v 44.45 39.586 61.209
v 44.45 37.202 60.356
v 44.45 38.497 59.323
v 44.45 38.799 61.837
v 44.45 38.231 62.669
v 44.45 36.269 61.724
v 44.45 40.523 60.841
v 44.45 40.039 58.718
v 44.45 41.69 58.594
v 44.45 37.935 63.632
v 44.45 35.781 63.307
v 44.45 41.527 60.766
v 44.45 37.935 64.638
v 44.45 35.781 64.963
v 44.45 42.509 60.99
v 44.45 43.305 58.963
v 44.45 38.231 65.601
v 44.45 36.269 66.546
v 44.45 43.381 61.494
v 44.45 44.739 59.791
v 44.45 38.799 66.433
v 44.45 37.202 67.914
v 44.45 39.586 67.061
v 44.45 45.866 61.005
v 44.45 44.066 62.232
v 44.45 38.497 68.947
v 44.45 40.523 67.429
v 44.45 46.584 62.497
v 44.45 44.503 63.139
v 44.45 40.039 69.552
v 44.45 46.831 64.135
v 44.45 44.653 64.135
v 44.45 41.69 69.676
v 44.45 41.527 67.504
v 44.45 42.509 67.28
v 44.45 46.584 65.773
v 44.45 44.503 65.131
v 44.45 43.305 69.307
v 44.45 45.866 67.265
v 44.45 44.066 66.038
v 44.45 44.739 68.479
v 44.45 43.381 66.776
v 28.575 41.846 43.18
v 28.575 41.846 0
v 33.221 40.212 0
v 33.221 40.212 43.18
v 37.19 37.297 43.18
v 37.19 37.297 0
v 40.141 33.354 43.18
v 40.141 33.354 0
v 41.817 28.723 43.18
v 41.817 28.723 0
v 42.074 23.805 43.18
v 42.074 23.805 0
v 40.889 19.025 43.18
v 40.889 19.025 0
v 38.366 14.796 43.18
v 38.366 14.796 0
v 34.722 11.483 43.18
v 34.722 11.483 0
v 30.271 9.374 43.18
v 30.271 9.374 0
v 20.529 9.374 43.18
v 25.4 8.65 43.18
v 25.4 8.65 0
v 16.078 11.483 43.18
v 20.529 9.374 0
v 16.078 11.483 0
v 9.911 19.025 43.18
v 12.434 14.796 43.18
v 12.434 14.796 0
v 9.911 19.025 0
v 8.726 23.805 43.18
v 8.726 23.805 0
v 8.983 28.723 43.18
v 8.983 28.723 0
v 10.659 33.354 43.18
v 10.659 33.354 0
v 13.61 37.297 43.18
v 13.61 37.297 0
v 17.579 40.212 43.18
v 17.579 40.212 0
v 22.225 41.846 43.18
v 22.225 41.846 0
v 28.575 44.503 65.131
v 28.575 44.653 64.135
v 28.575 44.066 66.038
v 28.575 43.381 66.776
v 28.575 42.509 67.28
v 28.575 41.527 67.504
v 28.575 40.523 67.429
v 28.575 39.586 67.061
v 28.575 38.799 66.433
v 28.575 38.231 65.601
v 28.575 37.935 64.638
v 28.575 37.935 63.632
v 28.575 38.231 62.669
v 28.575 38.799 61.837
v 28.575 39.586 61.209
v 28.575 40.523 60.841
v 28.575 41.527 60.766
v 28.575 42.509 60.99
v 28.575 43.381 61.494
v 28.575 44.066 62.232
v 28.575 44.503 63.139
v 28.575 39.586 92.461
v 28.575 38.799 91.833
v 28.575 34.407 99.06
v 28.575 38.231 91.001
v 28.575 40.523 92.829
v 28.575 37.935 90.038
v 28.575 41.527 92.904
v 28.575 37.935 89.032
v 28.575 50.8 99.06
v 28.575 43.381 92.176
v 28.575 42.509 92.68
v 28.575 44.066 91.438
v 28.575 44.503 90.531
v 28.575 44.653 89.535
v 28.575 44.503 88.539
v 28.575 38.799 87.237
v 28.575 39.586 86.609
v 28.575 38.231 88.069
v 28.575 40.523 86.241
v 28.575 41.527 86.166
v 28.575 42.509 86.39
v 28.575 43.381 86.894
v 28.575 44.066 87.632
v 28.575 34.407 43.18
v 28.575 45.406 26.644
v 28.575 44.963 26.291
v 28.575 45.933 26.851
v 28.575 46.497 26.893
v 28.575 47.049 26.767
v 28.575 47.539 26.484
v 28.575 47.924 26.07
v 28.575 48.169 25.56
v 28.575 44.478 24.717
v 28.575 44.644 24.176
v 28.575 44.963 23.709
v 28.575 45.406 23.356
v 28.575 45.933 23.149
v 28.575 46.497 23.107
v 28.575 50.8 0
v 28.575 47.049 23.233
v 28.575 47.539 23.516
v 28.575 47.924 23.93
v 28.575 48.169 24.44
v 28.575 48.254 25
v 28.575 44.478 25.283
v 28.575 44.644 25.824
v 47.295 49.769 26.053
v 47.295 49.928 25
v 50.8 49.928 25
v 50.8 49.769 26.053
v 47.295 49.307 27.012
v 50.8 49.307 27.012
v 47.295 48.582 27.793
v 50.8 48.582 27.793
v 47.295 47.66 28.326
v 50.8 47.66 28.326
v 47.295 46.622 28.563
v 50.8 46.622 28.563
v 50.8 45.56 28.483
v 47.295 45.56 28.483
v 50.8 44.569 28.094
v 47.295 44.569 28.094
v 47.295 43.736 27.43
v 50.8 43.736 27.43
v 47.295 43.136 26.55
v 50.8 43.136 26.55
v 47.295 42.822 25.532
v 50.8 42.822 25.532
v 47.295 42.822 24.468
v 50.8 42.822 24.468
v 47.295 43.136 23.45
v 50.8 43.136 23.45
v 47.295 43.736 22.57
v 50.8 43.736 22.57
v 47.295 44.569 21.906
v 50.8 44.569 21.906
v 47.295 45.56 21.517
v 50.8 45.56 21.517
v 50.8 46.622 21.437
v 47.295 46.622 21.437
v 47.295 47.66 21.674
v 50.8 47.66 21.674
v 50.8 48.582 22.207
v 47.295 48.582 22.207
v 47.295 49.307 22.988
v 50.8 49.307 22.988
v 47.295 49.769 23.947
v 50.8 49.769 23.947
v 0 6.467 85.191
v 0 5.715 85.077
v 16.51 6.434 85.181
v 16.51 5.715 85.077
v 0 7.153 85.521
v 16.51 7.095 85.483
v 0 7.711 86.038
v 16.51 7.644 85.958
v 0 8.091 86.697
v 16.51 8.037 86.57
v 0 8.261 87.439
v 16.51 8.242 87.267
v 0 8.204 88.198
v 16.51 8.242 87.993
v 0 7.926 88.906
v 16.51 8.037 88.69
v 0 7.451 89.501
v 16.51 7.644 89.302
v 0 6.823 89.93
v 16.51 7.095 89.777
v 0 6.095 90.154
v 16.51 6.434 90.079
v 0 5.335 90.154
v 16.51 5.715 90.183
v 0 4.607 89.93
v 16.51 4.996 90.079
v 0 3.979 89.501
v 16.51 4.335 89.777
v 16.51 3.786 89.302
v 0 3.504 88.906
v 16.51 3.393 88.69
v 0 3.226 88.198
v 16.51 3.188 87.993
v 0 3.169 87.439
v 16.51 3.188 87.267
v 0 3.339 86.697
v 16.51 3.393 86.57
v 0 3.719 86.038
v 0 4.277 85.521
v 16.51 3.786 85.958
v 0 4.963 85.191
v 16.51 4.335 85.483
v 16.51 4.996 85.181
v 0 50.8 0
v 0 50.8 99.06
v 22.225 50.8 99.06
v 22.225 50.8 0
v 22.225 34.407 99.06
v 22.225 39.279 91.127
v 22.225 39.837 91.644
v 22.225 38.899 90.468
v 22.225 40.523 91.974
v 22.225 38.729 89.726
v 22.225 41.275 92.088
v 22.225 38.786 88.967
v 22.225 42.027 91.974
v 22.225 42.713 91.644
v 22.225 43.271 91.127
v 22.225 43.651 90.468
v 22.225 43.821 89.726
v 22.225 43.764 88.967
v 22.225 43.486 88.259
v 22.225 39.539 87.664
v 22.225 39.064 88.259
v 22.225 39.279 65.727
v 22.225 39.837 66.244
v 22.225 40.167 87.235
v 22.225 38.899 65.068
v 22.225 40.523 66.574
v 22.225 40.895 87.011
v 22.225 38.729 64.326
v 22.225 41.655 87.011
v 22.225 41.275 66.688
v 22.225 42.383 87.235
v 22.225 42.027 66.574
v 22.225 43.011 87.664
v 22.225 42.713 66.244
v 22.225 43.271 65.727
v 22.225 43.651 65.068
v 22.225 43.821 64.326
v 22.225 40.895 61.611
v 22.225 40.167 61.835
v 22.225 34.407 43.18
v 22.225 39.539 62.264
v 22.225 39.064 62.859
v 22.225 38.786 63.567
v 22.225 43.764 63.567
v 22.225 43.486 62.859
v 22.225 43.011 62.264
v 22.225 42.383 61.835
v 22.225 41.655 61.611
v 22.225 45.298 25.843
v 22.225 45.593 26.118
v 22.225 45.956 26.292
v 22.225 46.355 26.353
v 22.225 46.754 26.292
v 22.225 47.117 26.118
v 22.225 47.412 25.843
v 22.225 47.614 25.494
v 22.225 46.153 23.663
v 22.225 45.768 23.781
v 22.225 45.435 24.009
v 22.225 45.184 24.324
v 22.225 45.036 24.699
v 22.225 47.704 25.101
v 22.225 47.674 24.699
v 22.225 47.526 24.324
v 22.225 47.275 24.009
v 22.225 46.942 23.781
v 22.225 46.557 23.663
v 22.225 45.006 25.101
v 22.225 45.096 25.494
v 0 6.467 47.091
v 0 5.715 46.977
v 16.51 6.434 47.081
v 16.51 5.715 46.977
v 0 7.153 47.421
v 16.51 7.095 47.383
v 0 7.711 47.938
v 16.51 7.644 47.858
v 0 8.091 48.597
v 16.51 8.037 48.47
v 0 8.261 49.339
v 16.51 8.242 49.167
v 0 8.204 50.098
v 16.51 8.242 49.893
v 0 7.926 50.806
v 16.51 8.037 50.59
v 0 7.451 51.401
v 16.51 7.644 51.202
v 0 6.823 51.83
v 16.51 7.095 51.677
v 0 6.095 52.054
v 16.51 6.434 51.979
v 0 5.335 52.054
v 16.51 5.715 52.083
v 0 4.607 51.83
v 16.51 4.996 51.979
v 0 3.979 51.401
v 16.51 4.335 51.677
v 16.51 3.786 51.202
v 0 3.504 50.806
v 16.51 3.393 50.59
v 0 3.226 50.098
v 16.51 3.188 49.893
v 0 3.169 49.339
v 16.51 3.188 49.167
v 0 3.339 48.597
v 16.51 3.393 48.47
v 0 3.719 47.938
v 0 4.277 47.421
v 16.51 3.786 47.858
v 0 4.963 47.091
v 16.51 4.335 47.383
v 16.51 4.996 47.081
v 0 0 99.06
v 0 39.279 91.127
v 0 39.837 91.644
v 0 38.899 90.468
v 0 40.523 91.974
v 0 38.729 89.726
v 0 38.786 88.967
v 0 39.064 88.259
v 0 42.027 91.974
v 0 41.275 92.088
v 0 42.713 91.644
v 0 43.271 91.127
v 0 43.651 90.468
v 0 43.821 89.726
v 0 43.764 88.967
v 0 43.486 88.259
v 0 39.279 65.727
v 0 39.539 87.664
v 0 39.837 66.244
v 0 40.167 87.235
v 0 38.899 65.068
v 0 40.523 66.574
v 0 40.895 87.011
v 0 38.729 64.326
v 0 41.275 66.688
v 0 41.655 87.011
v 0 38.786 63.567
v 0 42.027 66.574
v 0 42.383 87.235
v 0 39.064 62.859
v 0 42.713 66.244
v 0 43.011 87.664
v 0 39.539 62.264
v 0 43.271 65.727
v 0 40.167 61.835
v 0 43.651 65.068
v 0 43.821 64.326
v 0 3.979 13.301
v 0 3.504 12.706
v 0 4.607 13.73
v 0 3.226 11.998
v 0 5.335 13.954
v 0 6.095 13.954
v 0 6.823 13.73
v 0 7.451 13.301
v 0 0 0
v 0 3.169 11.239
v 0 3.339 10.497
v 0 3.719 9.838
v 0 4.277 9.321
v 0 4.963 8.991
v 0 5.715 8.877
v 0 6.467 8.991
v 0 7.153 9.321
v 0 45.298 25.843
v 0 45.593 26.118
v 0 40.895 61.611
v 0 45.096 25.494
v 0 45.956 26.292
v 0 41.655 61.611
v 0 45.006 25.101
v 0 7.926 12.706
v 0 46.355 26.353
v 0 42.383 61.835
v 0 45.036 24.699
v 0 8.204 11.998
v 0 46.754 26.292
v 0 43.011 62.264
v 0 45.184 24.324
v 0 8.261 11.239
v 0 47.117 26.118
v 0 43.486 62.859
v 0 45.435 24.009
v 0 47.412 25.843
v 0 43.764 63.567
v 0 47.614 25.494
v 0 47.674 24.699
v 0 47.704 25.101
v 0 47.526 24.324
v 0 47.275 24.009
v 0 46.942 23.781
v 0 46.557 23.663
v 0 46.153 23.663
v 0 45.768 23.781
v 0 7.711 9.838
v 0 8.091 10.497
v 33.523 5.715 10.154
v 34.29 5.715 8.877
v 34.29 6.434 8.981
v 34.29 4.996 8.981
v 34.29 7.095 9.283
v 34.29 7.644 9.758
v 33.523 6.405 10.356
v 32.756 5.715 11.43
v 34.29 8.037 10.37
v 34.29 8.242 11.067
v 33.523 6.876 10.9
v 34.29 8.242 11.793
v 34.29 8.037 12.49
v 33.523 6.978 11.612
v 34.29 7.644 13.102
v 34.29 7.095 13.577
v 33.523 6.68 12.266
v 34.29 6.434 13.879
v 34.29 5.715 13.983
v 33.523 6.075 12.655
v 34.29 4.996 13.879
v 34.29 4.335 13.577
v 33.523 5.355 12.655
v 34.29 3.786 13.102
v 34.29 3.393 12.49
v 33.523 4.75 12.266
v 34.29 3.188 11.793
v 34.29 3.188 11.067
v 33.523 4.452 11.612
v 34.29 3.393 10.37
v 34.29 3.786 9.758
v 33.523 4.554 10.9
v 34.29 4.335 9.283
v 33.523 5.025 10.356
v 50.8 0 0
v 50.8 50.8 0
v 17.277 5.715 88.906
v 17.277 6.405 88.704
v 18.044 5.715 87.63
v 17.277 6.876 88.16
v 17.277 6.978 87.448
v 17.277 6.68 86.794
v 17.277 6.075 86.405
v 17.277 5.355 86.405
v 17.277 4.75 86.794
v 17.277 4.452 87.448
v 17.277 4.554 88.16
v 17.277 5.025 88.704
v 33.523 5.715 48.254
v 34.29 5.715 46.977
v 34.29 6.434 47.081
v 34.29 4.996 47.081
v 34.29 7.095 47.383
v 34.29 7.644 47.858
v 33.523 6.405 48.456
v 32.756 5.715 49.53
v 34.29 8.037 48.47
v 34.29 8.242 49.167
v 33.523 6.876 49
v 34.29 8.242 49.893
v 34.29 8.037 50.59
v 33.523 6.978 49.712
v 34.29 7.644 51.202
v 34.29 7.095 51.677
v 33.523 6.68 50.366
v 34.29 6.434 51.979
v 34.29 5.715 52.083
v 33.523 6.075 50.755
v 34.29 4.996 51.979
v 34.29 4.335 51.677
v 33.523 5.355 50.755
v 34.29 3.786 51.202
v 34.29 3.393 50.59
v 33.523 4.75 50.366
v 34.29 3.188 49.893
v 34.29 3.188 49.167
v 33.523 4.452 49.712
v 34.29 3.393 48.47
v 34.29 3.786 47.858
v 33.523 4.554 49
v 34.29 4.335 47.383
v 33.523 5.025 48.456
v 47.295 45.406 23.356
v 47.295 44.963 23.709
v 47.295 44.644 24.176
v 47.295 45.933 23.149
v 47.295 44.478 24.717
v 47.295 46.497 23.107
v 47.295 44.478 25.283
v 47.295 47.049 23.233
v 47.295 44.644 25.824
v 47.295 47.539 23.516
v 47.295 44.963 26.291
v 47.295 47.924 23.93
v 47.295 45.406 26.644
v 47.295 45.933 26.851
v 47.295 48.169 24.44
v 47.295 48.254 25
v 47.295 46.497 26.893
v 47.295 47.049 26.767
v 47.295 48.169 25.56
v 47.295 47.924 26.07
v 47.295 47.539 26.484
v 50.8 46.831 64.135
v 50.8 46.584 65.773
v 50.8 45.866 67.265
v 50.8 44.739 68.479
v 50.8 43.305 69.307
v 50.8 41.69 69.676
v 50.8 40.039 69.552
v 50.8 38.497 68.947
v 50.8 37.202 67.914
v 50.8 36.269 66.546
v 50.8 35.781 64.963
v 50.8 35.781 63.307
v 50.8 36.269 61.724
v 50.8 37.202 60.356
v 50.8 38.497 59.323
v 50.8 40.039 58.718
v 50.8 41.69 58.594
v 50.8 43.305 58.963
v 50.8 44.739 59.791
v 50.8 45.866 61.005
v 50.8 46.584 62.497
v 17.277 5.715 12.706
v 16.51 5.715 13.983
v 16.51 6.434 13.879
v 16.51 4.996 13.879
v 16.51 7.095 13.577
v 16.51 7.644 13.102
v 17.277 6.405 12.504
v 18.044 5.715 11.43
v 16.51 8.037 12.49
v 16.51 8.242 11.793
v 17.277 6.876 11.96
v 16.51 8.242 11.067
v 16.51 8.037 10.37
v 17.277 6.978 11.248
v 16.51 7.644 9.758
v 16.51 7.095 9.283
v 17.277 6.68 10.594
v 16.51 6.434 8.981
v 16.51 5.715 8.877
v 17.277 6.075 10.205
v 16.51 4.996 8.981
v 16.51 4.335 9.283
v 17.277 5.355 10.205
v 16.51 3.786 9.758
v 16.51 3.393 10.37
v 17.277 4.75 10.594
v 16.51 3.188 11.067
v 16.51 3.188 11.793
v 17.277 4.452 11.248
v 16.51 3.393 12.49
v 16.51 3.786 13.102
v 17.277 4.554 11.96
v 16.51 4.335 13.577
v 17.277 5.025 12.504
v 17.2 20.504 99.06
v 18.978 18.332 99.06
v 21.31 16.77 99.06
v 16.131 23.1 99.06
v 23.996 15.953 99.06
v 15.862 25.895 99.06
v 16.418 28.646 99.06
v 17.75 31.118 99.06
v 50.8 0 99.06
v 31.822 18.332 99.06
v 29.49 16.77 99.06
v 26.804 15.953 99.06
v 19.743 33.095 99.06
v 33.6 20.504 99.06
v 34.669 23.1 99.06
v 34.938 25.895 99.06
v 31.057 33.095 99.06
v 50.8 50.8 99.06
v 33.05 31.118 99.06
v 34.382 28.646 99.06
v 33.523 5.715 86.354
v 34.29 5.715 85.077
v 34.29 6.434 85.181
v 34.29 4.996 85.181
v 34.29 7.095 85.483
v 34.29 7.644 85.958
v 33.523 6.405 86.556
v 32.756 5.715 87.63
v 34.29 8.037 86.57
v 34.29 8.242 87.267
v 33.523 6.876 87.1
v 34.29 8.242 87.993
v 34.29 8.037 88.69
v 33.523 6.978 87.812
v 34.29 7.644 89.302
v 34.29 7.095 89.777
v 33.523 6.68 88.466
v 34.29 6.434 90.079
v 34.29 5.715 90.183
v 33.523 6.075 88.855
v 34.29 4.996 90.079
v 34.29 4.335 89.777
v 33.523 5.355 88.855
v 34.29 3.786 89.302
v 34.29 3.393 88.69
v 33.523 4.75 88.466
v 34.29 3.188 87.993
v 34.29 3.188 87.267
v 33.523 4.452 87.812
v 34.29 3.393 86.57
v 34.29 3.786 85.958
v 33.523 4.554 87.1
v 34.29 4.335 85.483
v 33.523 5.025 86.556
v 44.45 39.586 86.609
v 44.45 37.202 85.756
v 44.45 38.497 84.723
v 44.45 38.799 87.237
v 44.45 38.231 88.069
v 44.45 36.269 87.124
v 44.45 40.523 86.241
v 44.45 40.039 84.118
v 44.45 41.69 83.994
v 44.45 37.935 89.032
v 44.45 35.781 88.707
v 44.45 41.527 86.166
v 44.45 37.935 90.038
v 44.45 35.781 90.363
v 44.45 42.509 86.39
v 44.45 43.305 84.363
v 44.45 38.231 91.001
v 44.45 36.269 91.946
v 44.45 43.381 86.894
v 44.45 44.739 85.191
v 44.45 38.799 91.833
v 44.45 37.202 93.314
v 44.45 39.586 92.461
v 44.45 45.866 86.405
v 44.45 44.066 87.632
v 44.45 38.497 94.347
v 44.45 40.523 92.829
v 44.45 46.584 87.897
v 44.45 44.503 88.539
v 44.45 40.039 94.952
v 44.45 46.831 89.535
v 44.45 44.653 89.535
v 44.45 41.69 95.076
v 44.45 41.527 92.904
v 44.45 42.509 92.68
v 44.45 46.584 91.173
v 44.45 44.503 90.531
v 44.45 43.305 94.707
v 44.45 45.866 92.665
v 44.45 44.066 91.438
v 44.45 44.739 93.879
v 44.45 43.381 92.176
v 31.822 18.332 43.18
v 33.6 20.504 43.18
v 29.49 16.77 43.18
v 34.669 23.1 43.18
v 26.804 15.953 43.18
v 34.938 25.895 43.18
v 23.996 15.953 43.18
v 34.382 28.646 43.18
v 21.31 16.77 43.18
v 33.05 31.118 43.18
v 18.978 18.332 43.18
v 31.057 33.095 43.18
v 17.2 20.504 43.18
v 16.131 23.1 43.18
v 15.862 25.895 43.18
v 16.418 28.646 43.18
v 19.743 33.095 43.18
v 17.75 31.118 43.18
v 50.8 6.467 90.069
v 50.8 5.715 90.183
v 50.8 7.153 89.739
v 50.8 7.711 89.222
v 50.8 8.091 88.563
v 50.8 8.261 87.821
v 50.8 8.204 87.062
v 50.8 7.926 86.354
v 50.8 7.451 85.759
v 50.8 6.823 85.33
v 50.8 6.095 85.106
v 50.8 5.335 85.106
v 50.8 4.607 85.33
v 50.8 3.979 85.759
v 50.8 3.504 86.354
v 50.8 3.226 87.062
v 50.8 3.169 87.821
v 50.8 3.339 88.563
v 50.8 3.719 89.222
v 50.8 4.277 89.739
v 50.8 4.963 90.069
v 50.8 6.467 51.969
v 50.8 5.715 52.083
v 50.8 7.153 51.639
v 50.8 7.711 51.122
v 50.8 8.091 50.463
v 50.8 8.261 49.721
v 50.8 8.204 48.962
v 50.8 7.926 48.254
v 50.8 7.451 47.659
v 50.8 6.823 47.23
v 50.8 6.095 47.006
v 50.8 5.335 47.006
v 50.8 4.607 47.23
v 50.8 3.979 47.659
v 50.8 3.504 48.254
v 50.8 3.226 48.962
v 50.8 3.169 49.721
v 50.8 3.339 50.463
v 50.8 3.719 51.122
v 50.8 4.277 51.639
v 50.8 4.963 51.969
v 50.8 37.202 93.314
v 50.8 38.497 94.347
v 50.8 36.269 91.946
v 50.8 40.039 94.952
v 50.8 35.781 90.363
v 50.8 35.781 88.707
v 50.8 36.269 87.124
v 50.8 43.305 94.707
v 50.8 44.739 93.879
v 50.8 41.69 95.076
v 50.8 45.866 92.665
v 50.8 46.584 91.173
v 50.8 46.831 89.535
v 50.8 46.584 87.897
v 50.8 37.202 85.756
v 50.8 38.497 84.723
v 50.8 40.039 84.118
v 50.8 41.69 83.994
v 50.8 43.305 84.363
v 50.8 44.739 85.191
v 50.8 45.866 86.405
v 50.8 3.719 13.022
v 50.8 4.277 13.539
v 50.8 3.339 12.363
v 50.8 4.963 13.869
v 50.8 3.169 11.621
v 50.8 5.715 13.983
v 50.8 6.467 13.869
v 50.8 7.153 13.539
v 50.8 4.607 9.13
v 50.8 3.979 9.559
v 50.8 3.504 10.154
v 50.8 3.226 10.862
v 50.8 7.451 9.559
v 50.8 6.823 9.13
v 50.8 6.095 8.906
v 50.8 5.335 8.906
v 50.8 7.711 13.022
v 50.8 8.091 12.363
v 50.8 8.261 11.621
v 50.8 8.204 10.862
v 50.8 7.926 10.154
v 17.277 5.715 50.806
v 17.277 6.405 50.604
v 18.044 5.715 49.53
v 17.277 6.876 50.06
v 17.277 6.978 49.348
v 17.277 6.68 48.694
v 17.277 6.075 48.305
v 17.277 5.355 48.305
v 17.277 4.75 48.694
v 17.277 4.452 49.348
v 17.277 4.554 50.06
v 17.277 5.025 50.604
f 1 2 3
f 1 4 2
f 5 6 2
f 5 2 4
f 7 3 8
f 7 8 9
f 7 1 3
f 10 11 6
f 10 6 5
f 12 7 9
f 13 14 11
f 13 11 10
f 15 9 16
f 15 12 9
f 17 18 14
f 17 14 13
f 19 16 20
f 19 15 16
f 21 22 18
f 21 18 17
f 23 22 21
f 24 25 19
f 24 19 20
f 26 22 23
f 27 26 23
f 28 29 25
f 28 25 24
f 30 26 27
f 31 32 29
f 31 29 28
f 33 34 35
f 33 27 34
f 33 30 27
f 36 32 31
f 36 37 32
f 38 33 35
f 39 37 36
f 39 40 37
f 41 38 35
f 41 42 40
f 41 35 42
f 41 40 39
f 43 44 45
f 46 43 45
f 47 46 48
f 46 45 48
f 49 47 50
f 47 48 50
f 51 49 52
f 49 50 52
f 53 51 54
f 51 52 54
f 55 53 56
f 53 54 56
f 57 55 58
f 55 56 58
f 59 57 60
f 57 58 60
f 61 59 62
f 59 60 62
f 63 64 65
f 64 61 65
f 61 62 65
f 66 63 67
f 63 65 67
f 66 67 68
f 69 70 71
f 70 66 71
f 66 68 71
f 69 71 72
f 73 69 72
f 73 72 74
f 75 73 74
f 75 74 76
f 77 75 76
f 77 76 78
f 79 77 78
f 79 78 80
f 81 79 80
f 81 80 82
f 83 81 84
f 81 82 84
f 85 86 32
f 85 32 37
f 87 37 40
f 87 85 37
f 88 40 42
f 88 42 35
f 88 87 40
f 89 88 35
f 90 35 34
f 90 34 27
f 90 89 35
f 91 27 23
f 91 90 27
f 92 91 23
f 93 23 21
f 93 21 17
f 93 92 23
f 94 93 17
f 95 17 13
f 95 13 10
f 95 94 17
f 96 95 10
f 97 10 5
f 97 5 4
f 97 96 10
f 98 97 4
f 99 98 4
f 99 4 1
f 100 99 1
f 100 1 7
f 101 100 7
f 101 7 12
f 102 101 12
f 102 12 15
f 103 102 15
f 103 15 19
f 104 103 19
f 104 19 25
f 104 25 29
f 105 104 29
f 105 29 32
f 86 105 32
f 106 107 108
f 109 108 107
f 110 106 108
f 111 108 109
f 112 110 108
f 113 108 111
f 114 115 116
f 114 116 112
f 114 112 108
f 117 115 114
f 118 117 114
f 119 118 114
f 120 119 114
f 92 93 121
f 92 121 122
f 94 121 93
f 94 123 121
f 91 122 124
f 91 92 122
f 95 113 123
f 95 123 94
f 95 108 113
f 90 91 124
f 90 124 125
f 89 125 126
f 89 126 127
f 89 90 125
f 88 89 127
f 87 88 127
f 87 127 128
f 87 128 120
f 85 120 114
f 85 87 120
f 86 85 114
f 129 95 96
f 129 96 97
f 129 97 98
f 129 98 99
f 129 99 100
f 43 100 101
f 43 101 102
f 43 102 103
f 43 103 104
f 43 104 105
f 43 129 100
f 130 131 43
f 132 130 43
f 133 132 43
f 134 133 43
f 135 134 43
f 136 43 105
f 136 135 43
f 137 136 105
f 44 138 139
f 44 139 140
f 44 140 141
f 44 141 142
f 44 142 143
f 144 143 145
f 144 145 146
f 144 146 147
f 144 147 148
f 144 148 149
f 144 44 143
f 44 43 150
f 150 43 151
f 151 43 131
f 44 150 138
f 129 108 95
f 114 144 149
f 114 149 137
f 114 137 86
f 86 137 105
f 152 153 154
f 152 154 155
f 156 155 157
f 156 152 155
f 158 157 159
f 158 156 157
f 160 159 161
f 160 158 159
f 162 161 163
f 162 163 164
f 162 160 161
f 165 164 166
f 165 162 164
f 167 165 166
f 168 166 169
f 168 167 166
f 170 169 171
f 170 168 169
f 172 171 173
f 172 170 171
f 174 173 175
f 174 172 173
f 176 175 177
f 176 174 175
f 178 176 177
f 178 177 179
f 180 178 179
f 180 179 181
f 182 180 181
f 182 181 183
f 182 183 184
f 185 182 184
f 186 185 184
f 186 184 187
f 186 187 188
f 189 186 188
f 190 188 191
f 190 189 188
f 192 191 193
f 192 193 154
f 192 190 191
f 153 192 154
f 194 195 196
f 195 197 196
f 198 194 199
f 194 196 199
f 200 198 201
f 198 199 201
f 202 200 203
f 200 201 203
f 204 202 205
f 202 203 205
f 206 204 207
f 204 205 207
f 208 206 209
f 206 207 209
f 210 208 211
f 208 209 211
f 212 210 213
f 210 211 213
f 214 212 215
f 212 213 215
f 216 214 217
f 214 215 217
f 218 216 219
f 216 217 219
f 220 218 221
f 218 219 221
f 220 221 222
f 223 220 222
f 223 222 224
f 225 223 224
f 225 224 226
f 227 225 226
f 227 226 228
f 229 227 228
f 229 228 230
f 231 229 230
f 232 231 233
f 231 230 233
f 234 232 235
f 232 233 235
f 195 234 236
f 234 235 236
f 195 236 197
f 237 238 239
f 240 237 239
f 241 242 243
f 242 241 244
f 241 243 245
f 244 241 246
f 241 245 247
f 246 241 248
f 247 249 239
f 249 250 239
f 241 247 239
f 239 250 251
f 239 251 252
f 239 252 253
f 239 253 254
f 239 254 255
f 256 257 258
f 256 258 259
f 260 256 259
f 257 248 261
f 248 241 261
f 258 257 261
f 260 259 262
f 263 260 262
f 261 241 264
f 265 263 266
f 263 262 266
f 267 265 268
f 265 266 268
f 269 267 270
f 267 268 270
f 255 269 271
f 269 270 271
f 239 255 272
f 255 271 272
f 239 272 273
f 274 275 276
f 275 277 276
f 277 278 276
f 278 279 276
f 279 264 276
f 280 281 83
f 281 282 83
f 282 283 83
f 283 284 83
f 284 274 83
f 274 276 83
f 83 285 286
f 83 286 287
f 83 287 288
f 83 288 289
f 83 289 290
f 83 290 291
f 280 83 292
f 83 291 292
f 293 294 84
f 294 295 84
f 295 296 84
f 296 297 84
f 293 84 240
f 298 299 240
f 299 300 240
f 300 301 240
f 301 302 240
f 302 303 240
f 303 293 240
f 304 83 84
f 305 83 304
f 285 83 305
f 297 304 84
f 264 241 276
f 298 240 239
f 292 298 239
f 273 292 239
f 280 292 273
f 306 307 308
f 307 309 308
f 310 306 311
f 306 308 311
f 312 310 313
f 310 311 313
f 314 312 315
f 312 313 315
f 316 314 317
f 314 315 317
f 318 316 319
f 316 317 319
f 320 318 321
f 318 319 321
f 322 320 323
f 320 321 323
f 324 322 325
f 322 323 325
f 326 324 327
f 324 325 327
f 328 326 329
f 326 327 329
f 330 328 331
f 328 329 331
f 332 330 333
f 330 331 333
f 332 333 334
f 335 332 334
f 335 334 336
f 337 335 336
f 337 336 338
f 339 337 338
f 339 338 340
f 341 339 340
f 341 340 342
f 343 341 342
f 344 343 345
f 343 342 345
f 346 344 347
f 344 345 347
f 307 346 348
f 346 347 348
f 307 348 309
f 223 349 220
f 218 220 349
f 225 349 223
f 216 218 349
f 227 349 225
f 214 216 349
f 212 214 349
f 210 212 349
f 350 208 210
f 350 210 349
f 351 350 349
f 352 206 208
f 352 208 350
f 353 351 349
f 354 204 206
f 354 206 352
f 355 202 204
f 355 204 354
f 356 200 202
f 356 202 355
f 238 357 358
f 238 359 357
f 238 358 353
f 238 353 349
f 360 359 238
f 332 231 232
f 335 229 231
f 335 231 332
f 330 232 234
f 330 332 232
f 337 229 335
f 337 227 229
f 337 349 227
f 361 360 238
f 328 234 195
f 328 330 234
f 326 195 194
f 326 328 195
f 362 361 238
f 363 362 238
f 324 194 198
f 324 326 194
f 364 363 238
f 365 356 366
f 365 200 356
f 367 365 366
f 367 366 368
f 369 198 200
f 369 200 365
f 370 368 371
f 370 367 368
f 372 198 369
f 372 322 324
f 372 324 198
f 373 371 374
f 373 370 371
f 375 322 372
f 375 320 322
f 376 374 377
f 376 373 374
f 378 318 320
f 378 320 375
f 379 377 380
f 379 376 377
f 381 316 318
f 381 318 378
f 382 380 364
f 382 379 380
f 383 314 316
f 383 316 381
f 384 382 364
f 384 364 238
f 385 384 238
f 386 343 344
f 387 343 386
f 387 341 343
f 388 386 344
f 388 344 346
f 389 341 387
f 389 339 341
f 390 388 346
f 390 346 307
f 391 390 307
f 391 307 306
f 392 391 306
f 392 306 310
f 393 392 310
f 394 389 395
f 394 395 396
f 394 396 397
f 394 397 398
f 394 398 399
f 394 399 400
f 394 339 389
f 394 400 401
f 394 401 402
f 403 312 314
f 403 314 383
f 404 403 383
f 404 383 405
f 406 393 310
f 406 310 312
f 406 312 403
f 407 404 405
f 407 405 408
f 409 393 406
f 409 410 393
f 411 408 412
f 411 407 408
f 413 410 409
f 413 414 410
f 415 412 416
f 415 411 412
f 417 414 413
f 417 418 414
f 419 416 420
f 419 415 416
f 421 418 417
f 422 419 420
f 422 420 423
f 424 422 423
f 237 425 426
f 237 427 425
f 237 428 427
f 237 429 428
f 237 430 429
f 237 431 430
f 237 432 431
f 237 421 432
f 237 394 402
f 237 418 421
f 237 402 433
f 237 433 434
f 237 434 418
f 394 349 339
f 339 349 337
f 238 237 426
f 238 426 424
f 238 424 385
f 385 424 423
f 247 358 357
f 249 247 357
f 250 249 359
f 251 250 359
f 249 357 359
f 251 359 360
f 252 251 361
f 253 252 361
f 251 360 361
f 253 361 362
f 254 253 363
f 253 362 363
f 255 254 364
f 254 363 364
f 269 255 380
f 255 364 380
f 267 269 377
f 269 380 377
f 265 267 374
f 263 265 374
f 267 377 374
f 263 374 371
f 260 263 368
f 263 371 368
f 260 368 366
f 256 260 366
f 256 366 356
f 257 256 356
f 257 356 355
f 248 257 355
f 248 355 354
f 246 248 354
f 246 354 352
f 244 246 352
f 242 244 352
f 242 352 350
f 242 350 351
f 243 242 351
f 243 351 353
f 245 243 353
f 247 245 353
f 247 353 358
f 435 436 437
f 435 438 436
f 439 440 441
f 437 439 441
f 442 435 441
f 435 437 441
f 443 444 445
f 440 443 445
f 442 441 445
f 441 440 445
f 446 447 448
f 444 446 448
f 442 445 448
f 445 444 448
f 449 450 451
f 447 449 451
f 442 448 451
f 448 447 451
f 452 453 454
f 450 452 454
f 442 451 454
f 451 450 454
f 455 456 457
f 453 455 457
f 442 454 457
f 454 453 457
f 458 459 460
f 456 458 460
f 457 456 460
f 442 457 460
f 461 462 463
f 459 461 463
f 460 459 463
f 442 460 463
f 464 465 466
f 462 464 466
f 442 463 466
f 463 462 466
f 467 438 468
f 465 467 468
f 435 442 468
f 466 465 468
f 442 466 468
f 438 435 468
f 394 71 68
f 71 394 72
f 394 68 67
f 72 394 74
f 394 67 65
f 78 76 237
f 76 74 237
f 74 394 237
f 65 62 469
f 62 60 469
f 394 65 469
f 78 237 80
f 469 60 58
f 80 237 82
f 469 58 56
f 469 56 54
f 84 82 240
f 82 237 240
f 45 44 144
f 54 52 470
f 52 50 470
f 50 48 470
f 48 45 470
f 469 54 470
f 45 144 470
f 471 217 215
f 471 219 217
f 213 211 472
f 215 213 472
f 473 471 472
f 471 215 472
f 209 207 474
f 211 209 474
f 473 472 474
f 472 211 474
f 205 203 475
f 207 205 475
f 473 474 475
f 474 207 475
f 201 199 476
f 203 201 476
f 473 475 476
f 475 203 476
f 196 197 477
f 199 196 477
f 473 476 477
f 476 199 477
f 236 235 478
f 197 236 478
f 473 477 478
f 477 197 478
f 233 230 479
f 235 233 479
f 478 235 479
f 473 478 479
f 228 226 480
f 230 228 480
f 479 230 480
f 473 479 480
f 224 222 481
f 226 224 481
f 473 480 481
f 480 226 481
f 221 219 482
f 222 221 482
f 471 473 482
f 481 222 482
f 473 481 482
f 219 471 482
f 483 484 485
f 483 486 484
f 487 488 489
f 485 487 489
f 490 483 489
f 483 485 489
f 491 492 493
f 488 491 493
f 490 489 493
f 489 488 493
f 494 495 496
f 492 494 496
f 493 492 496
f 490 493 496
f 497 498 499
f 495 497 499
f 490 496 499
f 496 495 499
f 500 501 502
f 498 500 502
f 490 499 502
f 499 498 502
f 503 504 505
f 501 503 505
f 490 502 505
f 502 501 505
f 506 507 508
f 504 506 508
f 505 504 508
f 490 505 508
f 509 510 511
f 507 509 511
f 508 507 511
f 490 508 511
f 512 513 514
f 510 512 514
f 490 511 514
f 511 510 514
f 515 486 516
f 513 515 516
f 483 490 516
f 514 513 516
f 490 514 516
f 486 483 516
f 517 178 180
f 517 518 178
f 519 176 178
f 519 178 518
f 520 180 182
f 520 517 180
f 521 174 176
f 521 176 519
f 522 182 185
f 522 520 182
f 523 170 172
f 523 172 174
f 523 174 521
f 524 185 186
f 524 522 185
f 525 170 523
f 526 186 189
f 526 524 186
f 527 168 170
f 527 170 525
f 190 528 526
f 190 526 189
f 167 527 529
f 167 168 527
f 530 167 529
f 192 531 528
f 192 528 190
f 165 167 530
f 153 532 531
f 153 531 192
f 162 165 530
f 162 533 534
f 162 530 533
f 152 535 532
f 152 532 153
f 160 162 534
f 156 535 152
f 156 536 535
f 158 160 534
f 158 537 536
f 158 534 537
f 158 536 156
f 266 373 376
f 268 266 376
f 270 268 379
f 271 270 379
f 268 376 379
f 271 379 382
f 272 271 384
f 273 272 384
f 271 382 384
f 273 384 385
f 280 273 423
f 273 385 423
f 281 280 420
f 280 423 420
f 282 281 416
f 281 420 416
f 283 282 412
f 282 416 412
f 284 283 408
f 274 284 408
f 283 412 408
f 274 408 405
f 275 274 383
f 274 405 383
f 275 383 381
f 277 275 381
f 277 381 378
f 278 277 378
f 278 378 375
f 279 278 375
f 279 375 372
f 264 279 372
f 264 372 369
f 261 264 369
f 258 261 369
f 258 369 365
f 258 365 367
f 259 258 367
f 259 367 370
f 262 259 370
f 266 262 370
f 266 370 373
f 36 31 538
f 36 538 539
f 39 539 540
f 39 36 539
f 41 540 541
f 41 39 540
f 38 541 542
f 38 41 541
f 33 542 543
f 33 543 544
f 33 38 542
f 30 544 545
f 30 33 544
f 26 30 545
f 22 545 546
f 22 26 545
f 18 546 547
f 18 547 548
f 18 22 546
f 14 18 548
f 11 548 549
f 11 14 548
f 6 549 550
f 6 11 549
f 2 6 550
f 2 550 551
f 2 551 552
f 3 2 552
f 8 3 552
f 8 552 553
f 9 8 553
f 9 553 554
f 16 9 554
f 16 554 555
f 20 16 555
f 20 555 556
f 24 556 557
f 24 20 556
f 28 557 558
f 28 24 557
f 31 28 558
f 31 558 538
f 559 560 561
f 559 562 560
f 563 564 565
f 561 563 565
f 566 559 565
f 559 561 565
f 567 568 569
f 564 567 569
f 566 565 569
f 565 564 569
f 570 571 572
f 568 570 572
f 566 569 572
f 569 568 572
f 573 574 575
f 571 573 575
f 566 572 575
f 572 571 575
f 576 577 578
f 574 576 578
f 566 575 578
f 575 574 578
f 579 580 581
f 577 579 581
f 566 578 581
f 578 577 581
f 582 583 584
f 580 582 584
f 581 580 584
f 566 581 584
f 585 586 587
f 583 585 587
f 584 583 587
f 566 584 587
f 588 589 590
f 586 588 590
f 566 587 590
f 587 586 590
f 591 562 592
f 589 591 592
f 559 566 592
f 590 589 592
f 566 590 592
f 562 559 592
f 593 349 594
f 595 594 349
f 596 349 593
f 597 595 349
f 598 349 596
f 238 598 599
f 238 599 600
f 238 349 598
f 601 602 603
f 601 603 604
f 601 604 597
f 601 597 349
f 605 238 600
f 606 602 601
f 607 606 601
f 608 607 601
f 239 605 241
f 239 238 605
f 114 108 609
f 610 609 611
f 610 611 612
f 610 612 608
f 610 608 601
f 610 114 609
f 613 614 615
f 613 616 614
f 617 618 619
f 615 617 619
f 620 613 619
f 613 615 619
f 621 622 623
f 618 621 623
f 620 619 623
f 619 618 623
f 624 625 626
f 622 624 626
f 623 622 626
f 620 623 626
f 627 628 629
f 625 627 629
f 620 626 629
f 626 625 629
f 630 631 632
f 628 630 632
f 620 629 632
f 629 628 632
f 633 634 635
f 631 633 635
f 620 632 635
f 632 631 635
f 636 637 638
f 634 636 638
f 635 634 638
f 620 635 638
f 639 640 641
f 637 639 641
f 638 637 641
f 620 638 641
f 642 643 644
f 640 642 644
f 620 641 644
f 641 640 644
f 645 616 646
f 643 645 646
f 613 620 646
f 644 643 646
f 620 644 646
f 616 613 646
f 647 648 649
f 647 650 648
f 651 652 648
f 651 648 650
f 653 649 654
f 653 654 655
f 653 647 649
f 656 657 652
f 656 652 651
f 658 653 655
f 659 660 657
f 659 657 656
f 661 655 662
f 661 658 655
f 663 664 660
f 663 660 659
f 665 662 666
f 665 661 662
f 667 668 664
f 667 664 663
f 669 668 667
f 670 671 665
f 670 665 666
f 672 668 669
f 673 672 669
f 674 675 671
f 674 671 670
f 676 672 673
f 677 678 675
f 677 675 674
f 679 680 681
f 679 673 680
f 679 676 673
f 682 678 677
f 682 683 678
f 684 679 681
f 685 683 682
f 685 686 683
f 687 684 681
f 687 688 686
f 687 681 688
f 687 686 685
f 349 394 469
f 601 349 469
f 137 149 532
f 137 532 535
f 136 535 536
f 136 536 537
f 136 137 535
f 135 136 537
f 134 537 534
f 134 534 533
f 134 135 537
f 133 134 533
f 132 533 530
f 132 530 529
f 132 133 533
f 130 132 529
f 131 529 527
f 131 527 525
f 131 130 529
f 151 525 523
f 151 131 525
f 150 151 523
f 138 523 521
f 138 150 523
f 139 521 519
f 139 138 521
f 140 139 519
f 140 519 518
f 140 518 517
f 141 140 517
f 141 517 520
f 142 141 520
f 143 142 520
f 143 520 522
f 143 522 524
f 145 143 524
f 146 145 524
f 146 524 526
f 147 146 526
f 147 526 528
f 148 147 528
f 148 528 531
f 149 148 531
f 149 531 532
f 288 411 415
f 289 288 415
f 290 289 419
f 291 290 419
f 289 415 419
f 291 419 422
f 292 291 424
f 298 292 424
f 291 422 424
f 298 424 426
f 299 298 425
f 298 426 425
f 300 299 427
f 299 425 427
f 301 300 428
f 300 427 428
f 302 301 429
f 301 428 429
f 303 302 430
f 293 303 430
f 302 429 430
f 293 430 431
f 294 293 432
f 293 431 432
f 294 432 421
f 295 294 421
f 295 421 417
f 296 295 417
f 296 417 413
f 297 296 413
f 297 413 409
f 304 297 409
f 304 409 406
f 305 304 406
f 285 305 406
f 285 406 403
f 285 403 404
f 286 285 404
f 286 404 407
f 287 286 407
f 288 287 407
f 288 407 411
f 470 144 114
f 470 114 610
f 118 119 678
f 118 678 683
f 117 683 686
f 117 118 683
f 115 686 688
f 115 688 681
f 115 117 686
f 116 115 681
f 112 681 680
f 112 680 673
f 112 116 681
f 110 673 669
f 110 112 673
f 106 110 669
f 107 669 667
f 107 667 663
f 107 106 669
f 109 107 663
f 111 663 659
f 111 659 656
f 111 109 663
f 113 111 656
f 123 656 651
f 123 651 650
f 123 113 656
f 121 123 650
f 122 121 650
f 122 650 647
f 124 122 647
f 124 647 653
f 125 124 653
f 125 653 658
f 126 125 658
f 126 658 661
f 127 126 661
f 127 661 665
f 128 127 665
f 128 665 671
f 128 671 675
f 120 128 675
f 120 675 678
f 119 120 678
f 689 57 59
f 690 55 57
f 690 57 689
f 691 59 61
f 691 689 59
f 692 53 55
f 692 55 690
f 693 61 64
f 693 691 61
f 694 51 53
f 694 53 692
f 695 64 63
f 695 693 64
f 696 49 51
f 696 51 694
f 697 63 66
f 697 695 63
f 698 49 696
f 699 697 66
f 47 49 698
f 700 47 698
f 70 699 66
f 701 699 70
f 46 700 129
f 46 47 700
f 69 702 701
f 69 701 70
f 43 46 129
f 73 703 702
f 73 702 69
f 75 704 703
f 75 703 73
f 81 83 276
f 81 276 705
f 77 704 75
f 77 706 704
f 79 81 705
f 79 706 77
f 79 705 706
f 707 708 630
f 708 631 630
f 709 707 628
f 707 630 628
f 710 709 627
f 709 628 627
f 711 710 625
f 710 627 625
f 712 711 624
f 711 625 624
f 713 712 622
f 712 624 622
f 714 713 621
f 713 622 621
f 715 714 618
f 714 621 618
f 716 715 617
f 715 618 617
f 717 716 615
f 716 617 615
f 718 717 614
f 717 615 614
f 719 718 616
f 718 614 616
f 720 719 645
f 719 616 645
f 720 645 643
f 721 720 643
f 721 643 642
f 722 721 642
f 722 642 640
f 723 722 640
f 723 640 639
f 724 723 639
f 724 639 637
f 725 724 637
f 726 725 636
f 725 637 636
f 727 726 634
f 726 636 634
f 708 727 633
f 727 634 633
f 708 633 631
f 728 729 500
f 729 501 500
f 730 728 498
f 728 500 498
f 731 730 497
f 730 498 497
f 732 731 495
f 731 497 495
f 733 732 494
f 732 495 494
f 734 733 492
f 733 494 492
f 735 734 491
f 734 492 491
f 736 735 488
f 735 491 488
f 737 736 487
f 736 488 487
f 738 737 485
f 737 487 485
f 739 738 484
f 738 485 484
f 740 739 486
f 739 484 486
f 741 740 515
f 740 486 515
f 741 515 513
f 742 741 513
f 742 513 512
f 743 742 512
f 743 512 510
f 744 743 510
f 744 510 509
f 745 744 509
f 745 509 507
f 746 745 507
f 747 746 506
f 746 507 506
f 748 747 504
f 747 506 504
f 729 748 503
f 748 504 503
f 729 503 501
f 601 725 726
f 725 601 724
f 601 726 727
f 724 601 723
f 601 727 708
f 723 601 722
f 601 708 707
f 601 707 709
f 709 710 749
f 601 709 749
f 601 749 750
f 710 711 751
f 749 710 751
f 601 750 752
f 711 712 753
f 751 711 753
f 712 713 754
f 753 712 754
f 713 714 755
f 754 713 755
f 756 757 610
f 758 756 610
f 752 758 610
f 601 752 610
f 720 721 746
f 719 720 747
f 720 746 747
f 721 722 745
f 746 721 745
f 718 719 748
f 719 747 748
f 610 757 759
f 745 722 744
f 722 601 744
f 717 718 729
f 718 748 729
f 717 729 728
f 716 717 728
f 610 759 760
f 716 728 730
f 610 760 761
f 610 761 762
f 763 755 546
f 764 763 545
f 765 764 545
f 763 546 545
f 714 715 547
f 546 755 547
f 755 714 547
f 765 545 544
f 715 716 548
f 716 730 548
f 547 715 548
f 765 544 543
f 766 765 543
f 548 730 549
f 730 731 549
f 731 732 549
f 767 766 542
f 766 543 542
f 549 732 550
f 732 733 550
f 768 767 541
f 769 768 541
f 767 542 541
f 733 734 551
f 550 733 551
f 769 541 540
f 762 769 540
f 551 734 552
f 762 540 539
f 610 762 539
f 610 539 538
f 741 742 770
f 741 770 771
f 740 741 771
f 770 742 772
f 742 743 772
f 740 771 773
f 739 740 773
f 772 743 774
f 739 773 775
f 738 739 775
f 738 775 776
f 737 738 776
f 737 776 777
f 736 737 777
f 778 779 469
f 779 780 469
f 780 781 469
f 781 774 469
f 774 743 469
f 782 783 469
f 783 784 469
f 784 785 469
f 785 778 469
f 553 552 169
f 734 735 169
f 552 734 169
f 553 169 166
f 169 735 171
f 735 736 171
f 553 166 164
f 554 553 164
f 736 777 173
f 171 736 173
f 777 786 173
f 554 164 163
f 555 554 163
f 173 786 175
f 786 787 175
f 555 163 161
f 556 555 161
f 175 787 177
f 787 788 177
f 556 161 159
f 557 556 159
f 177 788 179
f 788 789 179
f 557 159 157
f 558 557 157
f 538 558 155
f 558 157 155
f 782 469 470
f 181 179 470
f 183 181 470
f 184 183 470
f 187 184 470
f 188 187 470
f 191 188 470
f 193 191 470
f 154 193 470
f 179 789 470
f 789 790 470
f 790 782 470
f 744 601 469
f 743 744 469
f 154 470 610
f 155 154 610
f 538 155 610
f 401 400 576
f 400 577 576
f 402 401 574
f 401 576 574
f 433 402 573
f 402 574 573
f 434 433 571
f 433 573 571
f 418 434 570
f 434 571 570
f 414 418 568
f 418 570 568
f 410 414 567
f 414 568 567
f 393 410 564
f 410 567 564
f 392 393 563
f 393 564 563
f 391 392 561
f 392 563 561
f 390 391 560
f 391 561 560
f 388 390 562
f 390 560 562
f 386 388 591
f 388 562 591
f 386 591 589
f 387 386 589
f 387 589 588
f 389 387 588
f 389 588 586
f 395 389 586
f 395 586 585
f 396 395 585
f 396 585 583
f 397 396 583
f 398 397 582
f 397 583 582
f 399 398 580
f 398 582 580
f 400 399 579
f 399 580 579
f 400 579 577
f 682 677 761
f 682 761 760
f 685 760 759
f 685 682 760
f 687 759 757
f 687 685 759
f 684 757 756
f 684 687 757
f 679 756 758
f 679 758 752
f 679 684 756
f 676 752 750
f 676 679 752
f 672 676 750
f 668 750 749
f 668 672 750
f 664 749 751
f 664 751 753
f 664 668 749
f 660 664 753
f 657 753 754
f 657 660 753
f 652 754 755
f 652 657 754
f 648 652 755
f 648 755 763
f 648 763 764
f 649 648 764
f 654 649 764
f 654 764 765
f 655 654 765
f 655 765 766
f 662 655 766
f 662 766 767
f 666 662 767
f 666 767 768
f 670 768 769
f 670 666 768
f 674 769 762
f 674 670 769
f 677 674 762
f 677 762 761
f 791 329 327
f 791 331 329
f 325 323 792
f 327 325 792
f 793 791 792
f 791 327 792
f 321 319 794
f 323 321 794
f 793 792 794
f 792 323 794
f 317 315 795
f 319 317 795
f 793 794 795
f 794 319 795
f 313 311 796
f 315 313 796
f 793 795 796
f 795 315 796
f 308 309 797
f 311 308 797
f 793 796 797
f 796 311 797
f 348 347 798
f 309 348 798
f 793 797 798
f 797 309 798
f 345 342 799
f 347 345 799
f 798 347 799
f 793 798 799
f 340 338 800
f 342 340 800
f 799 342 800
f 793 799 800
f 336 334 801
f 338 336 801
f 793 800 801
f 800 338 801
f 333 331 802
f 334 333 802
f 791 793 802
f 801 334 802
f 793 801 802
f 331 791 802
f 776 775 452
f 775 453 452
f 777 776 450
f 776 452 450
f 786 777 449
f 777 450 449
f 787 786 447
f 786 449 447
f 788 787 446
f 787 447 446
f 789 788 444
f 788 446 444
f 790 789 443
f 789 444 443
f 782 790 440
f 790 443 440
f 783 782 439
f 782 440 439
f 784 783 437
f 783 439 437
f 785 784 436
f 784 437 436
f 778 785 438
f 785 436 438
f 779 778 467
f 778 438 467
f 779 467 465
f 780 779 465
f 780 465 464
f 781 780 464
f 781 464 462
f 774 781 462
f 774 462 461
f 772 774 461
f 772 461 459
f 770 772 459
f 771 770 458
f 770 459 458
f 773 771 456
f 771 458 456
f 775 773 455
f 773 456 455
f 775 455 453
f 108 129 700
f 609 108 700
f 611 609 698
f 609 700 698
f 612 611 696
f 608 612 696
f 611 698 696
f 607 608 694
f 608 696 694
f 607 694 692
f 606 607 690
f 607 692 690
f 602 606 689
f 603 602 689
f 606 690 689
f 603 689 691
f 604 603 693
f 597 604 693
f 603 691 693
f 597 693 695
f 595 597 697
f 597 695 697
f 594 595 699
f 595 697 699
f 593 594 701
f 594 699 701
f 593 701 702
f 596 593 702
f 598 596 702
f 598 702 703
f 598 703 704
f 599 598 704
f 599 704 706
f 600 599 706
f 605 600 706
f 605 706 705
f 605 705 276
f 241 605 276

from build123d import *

# Parameters (mm, degrees)
SKETCH1_W                                    = 50.8
SKETCH1_H                                    = 50.8
BOSS_EXTRUDE1_DEPTH                          = 99.06
SKETCH2_R                                    = 16.75
CUT_EXTRUDE1_DEPTH                           = 43.18
SKETCH3_R                                    = 9.5504
CUT_EXTRUDE2_DEPTH                           = 92.015682165
SKETCH6_W                                    = 6.35
SKETCH6_H                                    = 25.4
CUT_EXTRUDE3_DEPTH                           = 123.36896502
CBORE_START                                  = 28.575
CBORE_FOR_1_4_SOCKET_HEAD_CAP_SCREW1_OUT_R   = 3.3782
CBORE_FOR_1_4_SOCKET_HEAD_CAP_SCREW1_DEPTH   = 22.225
CBORE_START_2                                = 44.45
CBORE_FOR_1_4_SOCKET_HEAD_CAP_SCREW1_2_O_R   = 5.55625
CBORE_FOR_1_4_SOCKET_HEAD_CAP_SCREW1_2_O_R_2 = 3.3782
CBORE_FOR_1_4_SOCKET_HEAD_CAP_SCREW1_2_DEPTH = 6.35
F_1_4_20_TAPPED_HOLE1_D                      = 5.1054
CBORE_FOR_6_SOCKET_HEAD_CAP_SCREW1_OUTL_R    = 1.89865
CBORE_FOR_6_SOCKET_HEAD_CAP_SCREW1_DEPTH     = 22.225
CBORE_START_3                                = 47.2948
CBORE_FOR_6_SOCKET_HEAD_CAP_SCREW1_2_OU_R    = 3.57251
CBORE_FOR_6_SOCKET_HEAD_CAP_SCREW1_2_OU_R_2  = 1.89865
CBORE_FOR_6_SOCKET_HEAD_CAP_SCREW1_2_DEPTH   = 3.5052
F_6_32_TAPPED_HOLE1_D                        = 2.7051
F_1_4_20_TAPPED_HOLE2_D                      = 5.1054
F_1_4_20_TAPPED_HOLE2_DEPTH                  = 16.51
F_1_4_20_TAPPED_HOLE2_TIP                    = 1.533816902
F_1_4_20_TAPPED_HOLE3_D                      = 5.1054
F_1_4_20_TAPPED_HOLE3_DEPTH                  = 16.51
F_1_4_20_TAPPED_HOLE3_TIP                    = 1.533816902


# Read off the part's stored shape, not the designer's step: CBORE for 1/4 Socket Head Cap Screw1, CBORE for #6 Socket Head Cap Screw1
with BuildPart() as part:
    # Sketch1 → Boss-Extrude1 (new body)
    with BuildSketch(Plane.XY):
        with Locations((25.4, 25.4)):
            Rectangle(SKETCH1_W, SKETCH1_H)
    extrude(amount=BOSS_EXTRUDE1_DEPTH)

    # Sketch2 → Cut-Extrude1 (cut)
    with BuildSketch(Plane(origin=(0, 0, 0), x_dir=(-1, 0, 0), z_dir=(0, 0, -1))):
        with Locations((-25.4, 25.4)):
            Circle(SKETCH2_R)
    extrude(amount=-CUT_EXTRUDE1_DEPTH, mode=Mode.SUBTRACT)

    # Sketch3 → Cut-Extrude2 (cut, through all)
    with BuildSketch(Plane(origin=(0, 0, 43.18), x_dir=(-1, 0, 0), z_dir=(0, 0, -1))):
        with Locations((-25.4, 25.4)):
            Circle(SKETCH3_R)
    extrude(amount=-CUT_EXTRUDE2_DEPTH, mode=Mode.SUBTRACT)

    # Sketch6 → Cut-Extrude3 (cut, through all)
    with BuildSketch(Plane(origin=(0, 0, 0), x_dir=(-1, 0, 0), z_dir=(0, 0, -1))):
        with Locations((-25.4, 38.1)):
            Rectangle(SKETCH6_W, SKETCH6_H)
    extrude(amount=-CUT_EXTRUDE3_DEPTH, mode=Mode.SUBTRACT)

    # CBORE for 1/4 Socket Head Cap Screw1 out → CBORE for 1/4 Socket Head Cap Screw1 (cut)
    with BuildSketch(Plane.YZ.offset(CBORE_START)):
        with Locations((41.275, 64.135)):
            Circle(CBORE_FOR_1_4_SOCKET_HEAD_CAP_SCREW1_OUT_R)
        with Locations((41.275, 89.535)):
            Circle(CBORE_FOR_1_4_SOCKET_HEAD_CAP_SCREW1_OUT_R)
    extrude(amount=CBORE_FOR_1_4_SOCKET_HEAD_CAP_SCREW1_DEPTH, mode=Mode.SUBTRACT)

    # CBORE for 1_4 Socket Head Cap Screw1 2 o → CBORE for 1_4 Socket Head Cap Screw1 2 (cut)
    # profile 1 of 2: a face of its own
    with BuildSketch(Plane.YZ.offset(CBORE_START_2)):
        with Locations((41.275, 64.135)):
            Circle(CBORE_FOR_1_4_SOCKET_HEAD_CAP_SCREW1_2_O_R)
        with Locations((41.275, 64.135)):
            Circle(CBORE_FOR_1_4_SOCKET_HEAD_CAP_SCREW1_2_O_R_2, mode=Mode.SUBTRACT)
    # profile 2 of 2: a face of its own
    with BuildSketch(Plane.YZ.offset(CBORE_START_2)):
        with Locations((41.275, 89.535)):
            Circle(CBORE_FOR_1_4_SOCKET_HEAD_CAP_SCREW1_2_O_R)
        with Locations((41.275, 89.535)):
            Circle(CBORE_FOR_1_4_SOCKET_HEAD_CAP_SCREW1_2_O_R_2, mode=Mode.SUBTRACT)
    extrude(amount=CBORE_FOR_1_4_SOCKET_HEAD_CAP_SCREW1_2_DEPTH, mode=Mode.SUBTRACT)

    # 1/4-20 Tapped Hole1 (through all)
    with Locations(Plane(origin=(22.225, 0, 0), x_dir=(0, 0, -1), z_dir=(1, 0, 0))):
        with Locations((-89.535, 41.275), (-64.135, 41.275)):
            Hole(F_1_4_20_TAPPED_HOLE1_D / 2)

    # CBORE for #6 Socket Head Cap Screw1 outl → CBORE for #6 Socket Head Cap Screw1 (cut)
    with BuildSketch(Plane.YZ.offset(CBORE_START)):
        with Locations((46.355, 25)):
            Circle(CBORE_FOR_6_SOCKET_HEAD_CAP_SCREW1_OUTL_R)
    extrude(amount=CBORE_FOR_6_SOCKET_HEAD_CAP_SCREW1_DEPTH, mode=Mode.SUBTRACT)

    # CBORE for _6 Socket Head Cap Screw1 2 ou → CBORE for _6 Socket Head Cap Screw1 2 (cut)
    with BuildSketch(Plane.YZ.offset(CBORE_START_3)):
        with Locations((46.355, 25)):
            Circle(CBORE_FOR_6_SOCKET_HEAD_CAP_SCREW1_2_OU_R)
        with Locations((46.355, 25)):
            Circle(CBORE_FOR_6_SOCKET_HEAD_CAP_SCREW1_2_OU_R_2, mode=Mode.SUBTRACT)
    extrude(amount=CBORE_FOR_6_SOCKET_HEAD_CAP_SCREW1_2_DEPTH, mode=Mode.SUBTRACT)

    # #6-32 Tapped Hole1 (through all)
    with Locations(Plane(origin=(22.225, 0, 0), x_dir=(0, 0, -1), z_dir=(1, 0, 0))):
        with Locations((-25, 46.355)):
            Hole(F_6_32_TAPPED_HOLE1_D / 2)

    # 1/4-20 Tapped Hole2
    with Locations(Plane(origin=(50.8, 0, 0), x_dir=(0, 0, -1), z_dir=(1, 0, 0))):
        with Locations((-87.63, 5.715), (-49.53, 5.715), (-11.43, 5.715)):
            Hole(F_1_4_20_TAPPED_HOLE2_D / 2, depth=F_1_4_20_TAPPED_HOLE2_DEPTH)
            with Locations((0, 0, -(F_1_4_20_TAPPED_HOLE2_DEPTH + F_1_4_20_TAPPED_HOLE2_TIP / 2))):  # 118° drill point
                Cone(0, F_1_4_20_TAPPED_HOLE2_D / 2, F_1_4_20_TAPPED_HOLE2_TIP, mode=Mode.SUBTRACT)

    # 1/4-20 Tapped Hole3
    with Locations(Plane.ZY):
        with Locations((11.43, 5.715), (49.53, 5.715), (87.63, 5.715)):
            Hole(F_1_4_20_TAPPED_HOLE3_D / 2, depth=F_1_4_20_TAPPED_HOLE3_DEPTH)
            with Locations((0, 0, -(F_1_4_20_TAPPED_HOLE3_DEPTH + F_1_4_20_TAPPED_HOLE3_TIP / 2))):  # 118° drill point
                Cone(0, F_1_4_20_TAPPED_HOLE3_D / 2, F_1_4_20_TAPPED_HOLE3_TIP, mode=Mode.SUBTRACT)


solid = part.part
